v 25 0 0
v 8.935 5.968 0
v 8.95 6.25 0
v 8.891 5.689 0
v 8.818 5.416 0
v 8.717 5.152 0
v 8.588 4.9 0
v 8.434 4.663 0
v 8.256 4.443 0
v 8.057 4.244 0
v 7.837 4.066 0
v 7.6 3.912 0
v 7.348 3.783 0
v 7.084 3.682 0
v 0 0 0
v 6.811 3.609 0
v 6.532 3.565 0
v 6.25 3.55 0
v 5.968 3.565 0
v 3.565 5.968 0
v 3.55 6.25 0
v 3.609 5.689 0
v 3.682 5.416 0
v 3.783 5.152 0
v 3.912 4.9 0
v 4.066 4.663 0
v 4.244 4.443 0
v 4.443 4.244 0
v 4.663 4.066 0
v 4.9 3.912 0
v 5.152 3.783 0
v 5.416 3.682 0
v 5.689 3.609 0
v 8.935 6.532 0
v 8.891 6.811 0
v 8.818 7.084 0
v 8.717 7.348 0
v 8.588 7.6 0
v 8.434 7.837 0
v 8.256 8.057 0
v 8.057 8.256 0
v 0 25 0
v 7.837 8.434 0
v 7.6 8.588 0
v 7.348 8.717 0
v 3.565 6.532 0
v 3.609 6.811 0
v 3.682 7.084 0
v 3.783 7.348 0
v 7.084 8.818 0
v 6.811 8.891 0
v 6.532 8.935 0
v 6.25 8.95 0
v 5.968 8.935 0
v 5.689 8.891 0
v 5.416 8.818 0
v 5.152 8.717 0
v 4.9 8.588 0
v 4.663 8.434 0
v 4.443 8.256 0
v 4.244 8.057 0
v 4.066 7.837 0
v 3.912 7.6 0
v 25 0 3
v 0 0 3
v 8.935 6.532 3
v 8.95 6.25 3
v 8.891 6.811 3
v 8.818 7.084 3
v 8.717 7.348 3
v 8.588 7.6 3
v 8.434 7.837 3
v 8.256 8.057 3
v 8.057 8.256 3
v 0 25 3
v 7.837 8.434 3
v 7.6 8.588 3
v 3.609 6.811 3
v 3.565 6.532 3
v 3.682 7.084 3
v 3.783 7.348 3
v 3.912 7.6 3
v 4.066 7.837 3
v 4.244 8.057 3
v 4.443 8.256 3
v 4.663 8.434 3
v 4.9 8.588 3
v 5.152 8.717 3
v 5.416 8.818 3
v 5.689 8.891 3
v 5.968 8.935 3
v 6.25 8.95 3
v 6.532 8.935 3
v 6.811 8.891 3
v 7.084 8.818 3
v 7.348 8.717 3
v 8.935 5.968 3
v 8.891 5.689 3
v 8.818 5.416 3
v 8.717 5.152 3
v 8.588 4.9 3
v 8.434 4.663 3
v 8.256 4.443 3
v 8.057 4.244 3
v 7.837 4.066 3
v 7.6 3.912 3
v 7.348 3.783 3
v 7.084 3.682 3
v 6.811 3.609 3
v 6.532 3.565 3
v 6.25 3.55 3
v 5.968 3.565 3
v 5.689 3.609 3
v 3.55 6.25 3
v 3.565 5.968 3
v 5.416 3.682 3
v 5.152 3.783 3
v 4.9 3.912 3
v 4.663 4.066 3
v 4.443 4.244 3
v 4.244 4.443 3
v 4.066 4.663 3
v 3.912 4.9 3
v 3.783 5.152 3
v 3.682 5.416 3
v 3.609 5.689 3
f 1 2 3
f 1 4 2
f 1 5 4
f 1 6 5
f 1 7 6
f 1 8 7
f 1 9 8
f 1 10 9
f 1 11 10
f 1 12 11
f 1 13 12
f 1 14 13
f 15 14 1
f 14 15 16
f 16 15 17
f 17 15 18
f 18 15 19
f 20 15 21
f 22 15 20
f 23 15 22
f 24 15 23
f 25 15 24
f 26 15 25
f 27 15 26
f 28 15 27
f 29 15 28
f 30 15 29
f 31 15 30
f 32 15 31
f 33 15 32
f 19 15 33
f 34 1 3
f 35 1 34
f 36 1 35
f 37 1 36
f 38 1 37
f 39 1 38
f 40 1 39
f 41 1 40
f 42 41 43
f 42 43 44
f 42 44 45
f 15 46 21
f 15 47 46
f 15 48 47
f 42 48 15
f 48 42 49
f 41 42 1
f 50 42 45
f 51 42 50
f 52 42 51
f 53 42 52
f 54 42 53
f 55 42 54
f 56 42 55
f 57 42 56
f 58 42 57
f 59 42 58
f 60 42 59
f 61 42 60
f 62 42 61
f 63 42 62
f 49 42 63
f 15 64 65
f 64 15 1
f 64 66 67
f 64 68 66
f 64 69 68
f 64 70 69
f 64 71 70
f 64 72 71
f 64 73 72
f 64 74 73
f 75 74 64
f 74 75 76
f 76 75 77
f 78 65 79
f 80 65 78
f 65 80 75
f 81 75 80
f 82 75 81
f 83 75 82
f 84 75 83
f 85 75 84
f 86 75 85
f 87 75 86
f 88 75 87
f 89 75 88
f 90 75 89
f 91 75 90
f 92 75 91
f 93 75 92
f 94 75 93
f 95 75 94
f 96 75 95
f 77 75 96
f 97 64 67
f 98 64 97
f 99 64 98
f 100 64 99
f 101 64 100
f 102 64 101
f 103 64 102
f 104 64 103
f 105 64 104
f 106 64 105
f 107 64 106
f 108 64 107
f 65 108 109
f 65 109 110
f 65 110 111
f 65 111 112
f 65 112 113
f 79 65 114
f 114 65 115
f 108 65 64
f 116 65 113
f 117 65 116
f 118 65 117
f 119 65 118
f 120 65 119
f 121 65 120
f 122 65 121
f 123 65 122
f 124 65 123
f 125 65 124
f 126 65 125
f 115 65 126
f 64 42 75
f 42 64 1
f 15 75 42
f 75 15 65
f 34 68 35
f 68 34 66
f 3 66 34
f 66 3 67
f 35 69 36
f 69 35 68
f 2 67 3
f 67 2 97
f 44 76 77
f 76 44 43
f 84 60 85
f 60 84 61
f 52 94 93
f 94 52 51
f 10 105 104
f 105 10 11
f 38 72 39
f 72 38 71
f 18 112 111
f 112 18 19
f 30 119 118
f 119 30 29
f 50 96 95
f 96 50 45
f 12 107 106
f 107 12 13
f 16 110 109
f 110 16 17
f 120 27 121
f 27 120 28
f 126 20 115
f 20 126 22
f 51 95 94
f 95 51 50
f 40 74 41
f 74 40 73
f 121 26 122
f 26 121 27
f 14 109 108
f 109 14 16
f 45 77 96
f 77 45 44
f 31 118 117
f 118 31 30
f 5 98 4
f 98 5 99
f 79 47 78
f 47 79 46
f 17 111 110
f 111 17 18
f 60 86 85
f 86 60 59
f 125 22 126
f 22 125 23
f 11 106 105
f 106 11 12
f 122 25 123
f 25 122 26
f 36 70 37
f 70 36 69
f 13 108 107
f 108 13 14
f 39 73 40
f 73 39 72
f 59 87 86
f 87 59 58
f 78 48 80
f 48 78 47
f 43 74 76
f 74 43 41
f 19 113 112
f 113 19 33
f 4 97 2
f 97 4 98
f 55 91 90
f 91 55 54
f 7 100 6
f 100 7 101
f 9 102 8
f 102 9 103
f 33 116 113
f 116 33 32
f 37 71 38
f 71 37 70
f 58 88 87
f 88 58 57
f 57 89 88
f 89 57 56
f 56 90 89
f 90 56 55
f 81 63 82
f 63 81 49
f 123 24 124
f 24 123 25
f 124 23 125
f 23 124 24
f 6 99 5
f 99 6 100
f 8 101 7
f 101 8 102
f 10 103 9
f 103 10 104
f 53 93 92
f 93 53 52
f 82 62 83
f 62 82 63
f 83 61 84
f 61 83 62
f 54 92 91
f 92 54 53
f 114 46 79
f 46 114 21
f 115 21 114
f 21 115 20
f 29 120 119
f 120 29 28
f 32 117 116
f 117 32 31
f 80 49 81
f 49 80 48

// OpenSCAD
// Triangular reinforcement gusset.
$fn = 60;
eps = 0.02;
leg = 25;
thickness = 3;
difference() {
    linear_extrude(height=thickness) polygon(points=[[0,0],[leg,0],[0,leg]]);
    translate([leg*0.25,leg*0.25,-eps]) cylinder(d=5.4,h=thickness+2*eps);
}
